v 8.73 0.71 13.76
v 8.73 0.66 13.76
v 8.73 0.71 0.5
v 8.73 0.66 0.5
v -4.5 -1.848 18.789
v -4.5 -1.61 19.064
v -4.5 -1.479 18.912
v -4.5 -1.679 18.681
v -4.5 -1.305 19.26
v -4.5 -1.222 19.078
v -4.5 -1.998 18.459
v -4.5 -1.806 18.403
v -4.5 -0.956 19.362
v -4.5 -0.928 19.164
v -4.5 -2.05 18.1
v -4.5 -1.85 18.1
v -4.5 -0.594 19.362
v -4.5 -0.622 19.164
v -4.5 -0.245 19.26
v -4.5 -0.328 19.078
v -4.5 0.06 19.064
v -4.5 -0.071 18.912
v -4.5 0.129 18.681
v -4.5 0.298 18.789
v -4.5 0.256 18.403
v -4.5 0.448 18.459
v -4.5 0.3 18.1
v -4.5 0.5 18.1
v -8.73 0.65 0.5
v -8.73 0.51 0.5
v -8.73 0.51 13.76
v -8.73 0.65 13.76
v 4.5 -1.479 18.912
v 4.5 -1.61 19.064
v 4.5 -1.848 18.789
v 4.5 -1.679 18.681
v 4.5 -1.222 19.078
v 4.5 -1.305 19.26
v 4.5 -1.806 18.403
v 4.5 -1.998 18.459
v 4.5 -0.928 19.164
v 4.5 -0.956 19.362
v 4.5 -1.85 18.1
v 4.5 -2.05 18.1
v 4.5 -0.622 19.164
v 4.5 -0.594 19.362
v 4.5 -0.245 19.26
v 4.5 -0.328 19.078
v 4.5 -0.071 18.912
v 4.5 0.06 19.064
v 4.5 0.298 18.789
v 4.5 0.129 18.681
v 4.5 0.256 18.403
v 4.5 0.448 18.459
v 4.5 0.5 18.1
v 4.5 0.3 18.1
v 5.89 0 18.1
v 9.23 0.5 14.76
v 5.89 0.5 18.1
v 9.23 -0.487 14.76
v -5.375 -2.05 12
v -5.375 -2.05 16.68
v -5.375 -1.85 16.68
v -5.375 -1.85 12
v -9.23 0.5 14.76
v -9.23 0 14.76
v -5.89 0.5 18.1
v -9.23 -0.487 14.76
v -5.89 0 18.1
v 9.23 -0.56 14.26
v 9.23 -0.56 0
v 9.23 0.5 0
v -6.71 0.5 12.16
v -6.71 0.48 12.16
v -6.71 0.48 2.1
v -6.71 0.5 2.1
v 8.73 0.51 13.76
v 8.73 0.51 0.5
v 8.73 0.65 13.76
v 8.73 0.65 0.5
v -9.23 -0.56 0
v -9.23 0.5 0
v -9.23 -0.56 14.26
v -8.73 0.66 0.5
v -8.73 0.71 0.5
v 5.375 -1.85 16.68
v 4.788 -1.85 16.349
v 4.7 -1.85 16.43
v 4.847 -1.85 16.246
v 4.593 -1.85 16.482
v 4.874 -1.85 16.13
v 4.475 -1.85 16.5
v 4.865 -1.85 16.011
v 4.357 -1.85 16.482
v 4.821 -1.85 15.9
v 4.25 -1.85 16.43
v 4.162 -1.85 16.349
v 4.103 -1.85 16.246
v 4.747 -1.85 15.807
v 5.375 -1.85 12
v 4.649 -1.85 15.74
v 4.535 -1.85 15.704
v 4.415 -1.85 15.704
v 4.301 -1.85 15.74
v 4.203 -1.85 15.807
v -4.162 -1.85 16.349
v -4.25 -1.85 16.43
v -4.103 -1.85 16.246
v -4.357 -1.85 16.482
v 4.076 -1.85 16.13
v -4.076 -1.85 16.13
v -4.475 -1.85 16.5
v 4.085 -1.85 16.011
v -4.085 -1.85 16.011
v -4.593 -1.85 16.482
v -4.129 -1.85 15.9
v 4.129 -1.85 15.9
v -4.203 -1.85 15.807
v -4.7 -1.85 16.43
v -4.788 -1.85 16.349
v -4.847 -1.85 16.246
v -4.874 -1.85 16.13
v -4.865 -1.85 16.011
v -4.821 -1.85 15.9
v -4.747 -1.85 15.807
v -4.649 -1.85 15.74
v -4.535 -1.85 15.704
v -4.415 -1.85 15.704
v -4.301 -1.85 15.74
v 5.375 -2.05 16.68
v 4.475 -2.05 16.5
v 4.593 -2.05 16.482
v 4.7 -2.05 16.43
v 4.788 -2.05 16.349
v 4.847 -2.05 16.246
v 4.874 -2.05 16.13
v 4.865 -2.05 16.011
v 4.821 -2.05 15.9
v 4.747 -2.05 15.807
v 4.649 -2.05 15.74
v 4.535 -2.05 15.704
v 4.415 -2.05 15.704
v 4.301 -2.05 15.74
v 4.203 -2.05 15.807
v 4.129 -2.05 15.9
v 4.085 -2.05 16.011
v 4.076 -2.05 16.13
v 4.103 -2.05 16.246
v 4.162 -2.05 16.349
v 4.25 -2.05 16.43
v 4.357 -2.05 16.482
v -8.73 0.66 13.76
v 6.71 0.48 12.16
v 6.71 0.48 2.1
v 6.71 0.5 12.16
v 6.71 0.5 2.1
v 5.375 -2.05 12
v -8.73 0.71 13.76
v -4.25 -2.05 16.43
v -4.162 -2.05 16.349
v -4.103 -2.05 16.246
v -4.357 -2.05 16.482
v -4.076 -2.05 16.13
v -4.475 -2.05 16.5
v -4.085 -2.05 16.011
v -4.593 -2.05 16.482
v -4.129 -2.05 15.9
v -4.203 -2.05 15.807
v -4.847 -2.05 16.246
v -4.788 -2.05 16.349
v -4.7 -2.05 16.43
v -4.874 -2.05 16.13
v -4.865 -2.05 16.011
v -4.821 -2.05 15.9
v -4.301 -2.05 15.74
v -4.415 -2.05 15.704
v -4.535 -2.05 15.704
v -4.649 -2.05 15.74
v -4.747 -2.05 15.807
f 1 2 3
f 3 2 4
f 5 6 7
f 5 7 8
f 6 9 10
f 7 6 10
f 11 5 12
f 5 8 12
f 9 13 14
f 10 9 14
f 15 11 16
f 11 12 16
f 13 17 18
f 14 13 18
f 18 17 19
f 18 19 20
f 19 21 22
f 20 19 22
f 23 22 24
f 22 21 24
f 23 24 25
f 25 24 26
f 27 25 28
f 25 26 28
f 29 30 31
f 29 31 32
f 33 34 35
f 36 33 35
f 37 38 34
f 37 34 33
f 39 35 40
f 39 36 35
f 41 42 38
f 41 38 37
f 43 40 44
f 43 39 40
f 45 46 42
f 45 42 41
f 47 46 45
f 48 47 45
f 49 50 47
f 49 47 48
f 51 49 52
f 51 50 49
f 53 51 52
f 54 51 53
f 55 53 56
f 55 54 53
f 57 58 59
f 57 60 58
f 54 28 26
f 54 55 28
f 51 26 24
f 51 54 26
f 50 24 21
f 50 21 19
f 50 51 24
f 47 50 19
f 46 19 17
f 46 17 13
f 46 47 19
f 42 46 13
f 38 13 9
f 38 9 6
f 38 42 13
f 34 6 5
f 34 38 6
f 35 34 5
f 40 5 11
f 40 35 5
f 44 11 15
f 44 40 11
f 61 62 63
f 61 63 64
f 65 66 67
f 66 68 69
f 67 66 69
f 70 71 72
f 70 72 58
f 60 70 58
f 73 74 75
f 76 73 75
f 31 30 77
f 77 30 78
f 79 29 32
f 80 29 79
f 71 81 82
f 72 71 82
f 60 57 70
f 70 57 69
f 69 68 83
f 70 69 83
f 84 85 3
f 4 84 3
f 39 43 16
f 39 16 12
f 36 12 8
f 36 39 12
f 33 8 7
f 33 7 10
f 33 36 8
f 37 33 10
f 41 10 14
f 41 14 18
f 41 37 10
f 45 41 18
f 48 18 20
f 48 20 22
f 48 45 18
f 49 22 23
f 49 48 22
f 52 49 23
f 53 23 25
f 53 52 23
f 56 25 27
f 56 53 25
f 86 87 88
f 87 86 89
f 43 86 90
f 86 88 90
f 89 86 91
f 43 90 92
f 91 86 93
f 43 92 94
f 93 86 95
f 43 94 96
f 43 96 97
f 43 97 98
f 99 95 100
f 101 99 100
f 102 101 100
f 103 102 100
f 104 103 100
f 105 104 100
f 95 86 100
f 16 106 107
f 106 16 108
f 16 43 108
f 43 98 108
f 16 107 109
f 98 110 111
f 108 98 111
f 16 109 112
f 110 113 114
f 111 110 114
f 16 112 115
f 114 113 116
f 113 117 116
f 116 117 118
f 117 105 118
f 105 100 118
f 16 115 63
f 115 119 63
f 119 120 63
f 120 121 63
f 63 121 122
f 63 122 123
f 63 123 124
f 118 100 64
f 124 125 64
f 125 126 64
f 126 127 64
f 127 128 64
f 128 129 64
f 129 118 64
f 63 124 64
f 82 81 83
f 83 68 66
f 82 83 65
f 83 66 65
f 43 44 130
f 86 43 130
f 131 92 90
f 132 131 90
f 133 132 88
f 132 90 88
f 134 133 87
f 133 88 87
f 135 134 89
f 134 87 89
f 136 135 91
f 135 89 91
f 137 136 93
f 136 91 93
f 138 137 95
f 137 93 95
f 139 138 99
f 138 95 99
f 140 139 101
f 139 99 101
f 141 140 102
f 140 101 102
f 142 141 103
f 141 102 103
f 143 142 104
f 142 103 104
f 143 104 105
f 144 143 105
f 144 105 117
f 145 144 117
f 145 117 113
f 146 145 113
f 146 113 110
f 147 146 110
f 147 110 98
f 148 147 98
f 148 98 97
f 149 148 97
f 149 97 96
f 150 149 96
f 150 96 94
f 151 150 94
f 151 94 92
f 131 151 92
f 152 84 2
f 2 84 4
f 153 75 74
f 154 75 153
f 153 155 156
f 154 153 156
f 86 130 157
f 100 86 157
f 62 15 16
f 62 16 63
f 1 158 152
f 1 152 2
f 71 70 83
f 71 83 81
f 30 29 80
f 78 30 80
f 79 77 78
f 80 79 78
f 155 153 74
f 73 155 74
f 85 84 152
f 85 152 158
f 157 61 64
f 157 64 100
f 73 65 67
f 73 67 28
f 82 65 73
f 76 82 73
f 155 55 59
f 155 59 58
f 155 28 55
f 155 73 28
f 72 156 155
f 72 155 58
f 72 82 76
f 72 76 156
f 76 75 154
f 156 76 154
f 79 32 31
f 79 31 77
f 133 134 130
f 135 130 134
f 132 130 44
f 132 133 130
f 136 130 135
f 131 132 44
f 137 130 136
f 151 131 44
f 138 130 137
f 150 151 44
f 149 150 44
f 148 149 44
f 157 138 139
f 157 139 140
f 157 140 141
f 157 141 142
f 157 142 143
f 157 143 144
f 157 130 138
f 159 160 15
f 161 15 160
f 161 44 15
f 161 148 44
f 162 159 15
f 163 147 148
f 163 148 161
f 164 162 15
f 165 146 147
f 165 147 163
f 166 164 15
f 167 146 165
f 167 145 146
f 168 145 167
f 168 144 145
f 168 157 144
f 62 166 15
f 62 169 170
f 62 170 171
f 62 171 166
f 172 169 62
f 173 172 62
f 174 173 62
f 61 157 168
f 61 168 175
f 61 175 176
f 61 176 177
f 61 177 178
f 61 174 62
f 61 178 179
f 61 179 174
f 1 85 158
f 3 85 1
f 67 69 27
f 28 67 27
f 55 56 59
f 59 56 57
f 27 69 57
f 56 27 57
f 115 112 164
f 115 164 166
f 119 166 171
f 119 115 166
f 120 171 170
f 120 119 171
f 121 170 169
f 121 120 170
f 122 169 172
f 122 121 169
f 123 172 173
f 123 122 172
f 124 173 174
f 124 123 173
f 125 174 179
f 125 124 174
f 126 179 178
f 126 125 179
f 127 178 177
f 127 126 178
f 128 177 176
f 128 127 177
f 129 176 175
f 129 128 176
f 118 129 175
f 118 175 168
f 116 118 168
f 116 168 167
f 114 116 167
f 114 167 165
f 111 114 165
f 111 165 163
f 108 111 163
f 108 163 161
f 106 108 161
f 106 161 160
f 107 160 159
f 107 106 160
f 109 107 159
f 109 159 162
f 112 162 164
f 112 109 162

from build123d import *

# Parameters (mm, degrees)
EXTRUDE_1_DEPTH      = 0.5
SKETCH_3_W           = 9.23
SKETCH_3_H           = 14.26
EXTRUDE_2_DEPTH      = 0.56
SKETCH_4_W           = 8.73
SKETCH_4_H           = 13.26
EXTRUDE_3_DEPTH      = 0.14
SKETCH_6_W           = 6.71
SKETCH_6_H           = 10.06
CUT_EXTRUDE_1_DEPTH  = 0.02
EXTRUDE_4_REACH      = 22.328
CUT_EXTRUDE_2_DEPTH  = 21.327946281
SKETCH_9_W           = 8.73
SKETCH_9_H           = 13.26
EXTRUDE_2204_DEPTH   = 0.05
MIRROR_START         = 0.5
MIRROR_1_OUTLINE_W   = 8.73
MIRROR_1_OUTLINE_H   = 0.05
MIRROR_1_DEPTH       = 13.26
MIRROR_1_2_OUTLINE_W = 8.73
MIRROR_1_2_OUTLINE_H = 0.14
MIRROR_1_2_DEPTH     = 13.26
MIRROR_1_3_DEPTH     = 0.48
MIRROR_START_2       = -0.56
MIRROR_1_4_OUTLINE_W = 6.71
MIRROR_1_4_OUTLINE_H = 10.06
MIRROR_1_4_DEPTH     = 0.60719
MIRROR_START_3       = 0.48
MIRROR_1_5_DEPTH     = 0.02
MIRROR_START_4       = -9.23
MIRROR_1_6_DEPTH     = 9.23
MIRROR_START_5       = -20
MIRROR_1_7_OUTLINE_W = 8
MIRROR_1_7_OUTLINE_H = 2
MIRROR_1_7_DEPTH     = 3.036508319
EXTRUDE_6_DEPTH      = 4.5
EXTRUDE_7_DEPTH      = 0.2
SKETCH_15_R          = 0.4
CUT_EXTRUDE_3_DEPTH  = 22.613355246


with BuildPart() as part:
    # 草图2 → 凸台-拉伸1 (new body)
    with BuildSketch(Plane(origin=(0, 0, 0), x_dir=(1, 0, 0), z_dir=(0, 1, 0))):
        Polygon((9.23, -14.76), (5.89, -18.1), (0, -18.1), (0, 0), (9.23, 0), align=None)
    extrude(amount=EXTRUDE_1_DEPTH)

    # 草图3 → 凸台-拉伸2 (add)
    with BuildSketch(Plane.XZ):
        with Locations((4.615, 7.13)):
            Rectangle(SKETCH_3_W, SKETCH_3_H)
    extrude(amount=EXTRUDE_2_DEPTH)

    # 草图6 → 切除-拉伸1 (cut)
    with BuildSketch(Plane(origin=(0, 0.5, 0), x_dir=(1, 0, 0), z_dir=(0, 1, 0))):
        with Locations((3.355, -7.13)):
            Rectangle(SKETCH_6_W, SKETCH_6_H)
    extrude(amount=-CUT_EXTRUDE_1_DEPTH, mode=Mode.SUBTRACT)

    # 凸台-拉伸4: up to this face of the body (flat: up to its plane)
    extrude_4_end = Plane(part.part.faces().sort_by_distance((9.23, -0.025444369, 7.250073411))[0])
    # 草图8 → 凸台-拉伸4 (add, up to the picked face)
    with BuildSketch(Plane.ZY, mode=Mode.PRIVATE) as extrude_4_sk1:
        Polygon((14.26, 0), (18.1, 0), (14.26, -0.56), align=None)
    extrude_4_tool1 = split(extrude(extrude_4_sk1.sketch, amount=-EXTRUDE_4_REACH, mode=Mode.PRIVATE), bisect_by=extrude_4_end, keep=Keep.BOTH, mode=Mode.PRIVATE)
    add(extrude_4_tool1.solids().sort_by(Axis((0, -0.186667, 15.54), (1, 0, 0)))[0])

    # 草图12 → 切除-拉伸2 (cut, through all)
    with BuildSketch(Plane(origin=(0, 0, 0), x_dir=(1, 0, 0), z_dir=(0, 1, 0))):
        Polygon((9.23, -14.76), (5.89, -18.1), (9.23, -18.1), align=None)
    extrude(amount=-CUT_EXTRUDE_2_DEPTH, mode=Mode.SUBTRACT)

    # Mirror 1 3 outline → Mirror 1 3 (add)
    with BuildSketch(Plane(origin=(0, 0, 0), x_dir=(1, 0, 0), z_dir=(0, 1, 0))):
        Polygon((-5.89, -18.1), (0, -18.1), (0, 0), (-9.23, 0), (-9.23, -14.76), align=None)
    extrude(amount=MIRROR_1_3_DEPTH)

    # Mirror 1 4 outline → Mirror 1 4 (add)
    with BuildSketch(Plane(origin=(0, 0, 0), x_dir=(1, 0, 0), z_dir=(0, 1, 0)).offset(MIRROR_START_2)):
        with Locations((-3.355, -7.13)):
            Rectangle(MIRROR_1_4_OUTLINE_W, MIRROR_1_4_OUTLINE_H)
    extrude(amount=MIRROR_1_4_DEPTH)

    # Mirror 1 5 outline → Mirror 1 5 (add)
    with BuildSketch(Plane(origin=(0, 0, 0), x_dir=(1, 0, 0), z_dir=(0, 1, 0)).offset(MIRROR_START_3)):
        Polygon((-5.89, -18.1), (0, -18.1), (0, -12.16), (-6.71, -12.16), (-6.71, -2.1), (0, -2.1), (0, 0), (-9.23, 0), (-9.23, -14.76), align=None)
    extrude(amount=MIRROR_1_5_DEPTH)

    # Mirror 1 6 outline → Mirror 1 6 (add)
    with BuildSketch(Plane.YZ.offset(MIRROR_START_4)):
        Polygon((-0.56, 0), (0, 0), (0, 18.1), (-0.56, 14.26), align=None)
    extrude(amount=MIRROR_1_6_DEPTH)

    # Mirror 1 7 outline → Mirror 1 7 (cut)
    with BuildSketch(Plane(origin=(0, 0, 0), x_dir=(0.707106781186552, 0, 0.7071067811865429), z_dir=(0.707106781186543, 0, -0.707106781186552)).offset(MIRROR_START_5)):
        with Locations((6, 1)):
            Rectangle(MIRROR_1_7_OUTLINE_W, MIRROR_1_7_OUTLINE_H)
    extrude(amount=MIRROR_1_7_DEPTH, mode=Mode.SUBTRACT)

    # 草图11 → 凸台-拉伸6 (add, symmetric)
    with BuildSketch(Plane(origin=(0, 0, 0), x_dir=(0, 0, -1), z_dir=(1, 0, 0))):
        with BuildLine():
            Line((-18.1, -2.05), (-18.1, -1.85))
            ThreePointArc((-18.1, -1.85), (-19.175, -0.775), (-18.1, 0.3))
            Line((-18.1, 0.3), (-18.1, 0.5))
            ThreePointArc((-18.1, 0.5), (-19.375, -0.775), (-18.1, -2.05))
        make_face()
    extrude(amount=EXTRUDE_6_DEPTH, both=True)

    # 草图14 → 凸台-拉伸7 (add)
    with BuildSketch(Plane(origin=(0, -2.05, 0), x_dir=(-1, 0, 0), z_dir=(0, -1, 0))):
        Polygon((-5.375, -16.68), (-5.375, -12), (0, -12), (0, -18.1), (-4.5, -18.1), align=None)
    extrude_7 = extrude(amount=-EXTRUDE_7_DEPTH)

    # 草图15 → 切除-拉伸3 (cut, through all)
    with BuildSketch(Plane(origin=(0, -1.85, 0), x_dir=(1, 0, 0), z_dir=(0, 1, 0))):
        with Locations(Location((4.475, -16.1, 0), (0, 0, 270))):
            Circle(SKETCH_15_R)
    cut_extrude_3 = extrude(amount=-CUT_EXTRUDE_3_DEPTH, mode=Mode.SUBTRACT)

    # 镜向2: 凸台-拉伸7, 切除-拉伸3 across Right Plane
    add(extrude_7.mirror(Plane(origin=(0, 0, 0), x_dir=(0, 0, -1), z_dir=(1, 0, 0))))
    add(cut_extrude_3.mirror(Plane(origin=(0, 0, 0), x_dir=(0, 0, -1), z_dir=(1, 0, 0))), mode=Mode.SUBTRACT)


with BuildPart() as body_2:
    # 草图4 → 凸台-拉伸3 (new body)
    with BuildSketch(Plane(origin=(0, 0.51, 0), x_dir=(1, 0, 0), z_dir=(0, 1, 0))):
        with Locations((4.365, -7.13)):
            Rectangle(SKETCH_4_W, SKETCH_4_H)
    extrude(amount=EXTRUDE_3_DEPTH)

    # Mirror 1 2 outline → Mirror 1 2 (add)
    with BuildSketch(Plane.XY.offset(MIRROR_START)):
        with Locations((-4.365, 0.58)):
            Rectangle(MIRROR_1_2_OUTLINE_W, MIRROR_1_2_OUTLINE_H)
    extrude(amount=MIRROR_1_2_DEPTH)


with BuildPart() as body_3:
    # 草图9 → Extrude 2204 (new body)
    with BuildSketch(Plane(origin=(0, 0.66, 0), x_dir=(1, 0, 0), z_dir=(0, 1, 0))):
        with Locations((4.365, -7.13)):
            Rectangle(SKETCH_9_W, SKETCH_9_H)
    extrude(amount=EXTRUDE_2204_DEPTH)

    # 镜向1: read off the stored shape, not the designer's step
    # 镜向1 outline → 镜向1 (add)
    with BuildSketch(Plane.XY.offset(MIRROR_START)):
        with Locations((-4.365, 0.685)):
            Rectangle(MIRROR_1_OUTLINE_W, MIRROR_1_OUTLINE_H)
    extrude(amount=MIRROR_1_DEPTH)


solid = Compound([part.part, body_2.part, body_3.part])
